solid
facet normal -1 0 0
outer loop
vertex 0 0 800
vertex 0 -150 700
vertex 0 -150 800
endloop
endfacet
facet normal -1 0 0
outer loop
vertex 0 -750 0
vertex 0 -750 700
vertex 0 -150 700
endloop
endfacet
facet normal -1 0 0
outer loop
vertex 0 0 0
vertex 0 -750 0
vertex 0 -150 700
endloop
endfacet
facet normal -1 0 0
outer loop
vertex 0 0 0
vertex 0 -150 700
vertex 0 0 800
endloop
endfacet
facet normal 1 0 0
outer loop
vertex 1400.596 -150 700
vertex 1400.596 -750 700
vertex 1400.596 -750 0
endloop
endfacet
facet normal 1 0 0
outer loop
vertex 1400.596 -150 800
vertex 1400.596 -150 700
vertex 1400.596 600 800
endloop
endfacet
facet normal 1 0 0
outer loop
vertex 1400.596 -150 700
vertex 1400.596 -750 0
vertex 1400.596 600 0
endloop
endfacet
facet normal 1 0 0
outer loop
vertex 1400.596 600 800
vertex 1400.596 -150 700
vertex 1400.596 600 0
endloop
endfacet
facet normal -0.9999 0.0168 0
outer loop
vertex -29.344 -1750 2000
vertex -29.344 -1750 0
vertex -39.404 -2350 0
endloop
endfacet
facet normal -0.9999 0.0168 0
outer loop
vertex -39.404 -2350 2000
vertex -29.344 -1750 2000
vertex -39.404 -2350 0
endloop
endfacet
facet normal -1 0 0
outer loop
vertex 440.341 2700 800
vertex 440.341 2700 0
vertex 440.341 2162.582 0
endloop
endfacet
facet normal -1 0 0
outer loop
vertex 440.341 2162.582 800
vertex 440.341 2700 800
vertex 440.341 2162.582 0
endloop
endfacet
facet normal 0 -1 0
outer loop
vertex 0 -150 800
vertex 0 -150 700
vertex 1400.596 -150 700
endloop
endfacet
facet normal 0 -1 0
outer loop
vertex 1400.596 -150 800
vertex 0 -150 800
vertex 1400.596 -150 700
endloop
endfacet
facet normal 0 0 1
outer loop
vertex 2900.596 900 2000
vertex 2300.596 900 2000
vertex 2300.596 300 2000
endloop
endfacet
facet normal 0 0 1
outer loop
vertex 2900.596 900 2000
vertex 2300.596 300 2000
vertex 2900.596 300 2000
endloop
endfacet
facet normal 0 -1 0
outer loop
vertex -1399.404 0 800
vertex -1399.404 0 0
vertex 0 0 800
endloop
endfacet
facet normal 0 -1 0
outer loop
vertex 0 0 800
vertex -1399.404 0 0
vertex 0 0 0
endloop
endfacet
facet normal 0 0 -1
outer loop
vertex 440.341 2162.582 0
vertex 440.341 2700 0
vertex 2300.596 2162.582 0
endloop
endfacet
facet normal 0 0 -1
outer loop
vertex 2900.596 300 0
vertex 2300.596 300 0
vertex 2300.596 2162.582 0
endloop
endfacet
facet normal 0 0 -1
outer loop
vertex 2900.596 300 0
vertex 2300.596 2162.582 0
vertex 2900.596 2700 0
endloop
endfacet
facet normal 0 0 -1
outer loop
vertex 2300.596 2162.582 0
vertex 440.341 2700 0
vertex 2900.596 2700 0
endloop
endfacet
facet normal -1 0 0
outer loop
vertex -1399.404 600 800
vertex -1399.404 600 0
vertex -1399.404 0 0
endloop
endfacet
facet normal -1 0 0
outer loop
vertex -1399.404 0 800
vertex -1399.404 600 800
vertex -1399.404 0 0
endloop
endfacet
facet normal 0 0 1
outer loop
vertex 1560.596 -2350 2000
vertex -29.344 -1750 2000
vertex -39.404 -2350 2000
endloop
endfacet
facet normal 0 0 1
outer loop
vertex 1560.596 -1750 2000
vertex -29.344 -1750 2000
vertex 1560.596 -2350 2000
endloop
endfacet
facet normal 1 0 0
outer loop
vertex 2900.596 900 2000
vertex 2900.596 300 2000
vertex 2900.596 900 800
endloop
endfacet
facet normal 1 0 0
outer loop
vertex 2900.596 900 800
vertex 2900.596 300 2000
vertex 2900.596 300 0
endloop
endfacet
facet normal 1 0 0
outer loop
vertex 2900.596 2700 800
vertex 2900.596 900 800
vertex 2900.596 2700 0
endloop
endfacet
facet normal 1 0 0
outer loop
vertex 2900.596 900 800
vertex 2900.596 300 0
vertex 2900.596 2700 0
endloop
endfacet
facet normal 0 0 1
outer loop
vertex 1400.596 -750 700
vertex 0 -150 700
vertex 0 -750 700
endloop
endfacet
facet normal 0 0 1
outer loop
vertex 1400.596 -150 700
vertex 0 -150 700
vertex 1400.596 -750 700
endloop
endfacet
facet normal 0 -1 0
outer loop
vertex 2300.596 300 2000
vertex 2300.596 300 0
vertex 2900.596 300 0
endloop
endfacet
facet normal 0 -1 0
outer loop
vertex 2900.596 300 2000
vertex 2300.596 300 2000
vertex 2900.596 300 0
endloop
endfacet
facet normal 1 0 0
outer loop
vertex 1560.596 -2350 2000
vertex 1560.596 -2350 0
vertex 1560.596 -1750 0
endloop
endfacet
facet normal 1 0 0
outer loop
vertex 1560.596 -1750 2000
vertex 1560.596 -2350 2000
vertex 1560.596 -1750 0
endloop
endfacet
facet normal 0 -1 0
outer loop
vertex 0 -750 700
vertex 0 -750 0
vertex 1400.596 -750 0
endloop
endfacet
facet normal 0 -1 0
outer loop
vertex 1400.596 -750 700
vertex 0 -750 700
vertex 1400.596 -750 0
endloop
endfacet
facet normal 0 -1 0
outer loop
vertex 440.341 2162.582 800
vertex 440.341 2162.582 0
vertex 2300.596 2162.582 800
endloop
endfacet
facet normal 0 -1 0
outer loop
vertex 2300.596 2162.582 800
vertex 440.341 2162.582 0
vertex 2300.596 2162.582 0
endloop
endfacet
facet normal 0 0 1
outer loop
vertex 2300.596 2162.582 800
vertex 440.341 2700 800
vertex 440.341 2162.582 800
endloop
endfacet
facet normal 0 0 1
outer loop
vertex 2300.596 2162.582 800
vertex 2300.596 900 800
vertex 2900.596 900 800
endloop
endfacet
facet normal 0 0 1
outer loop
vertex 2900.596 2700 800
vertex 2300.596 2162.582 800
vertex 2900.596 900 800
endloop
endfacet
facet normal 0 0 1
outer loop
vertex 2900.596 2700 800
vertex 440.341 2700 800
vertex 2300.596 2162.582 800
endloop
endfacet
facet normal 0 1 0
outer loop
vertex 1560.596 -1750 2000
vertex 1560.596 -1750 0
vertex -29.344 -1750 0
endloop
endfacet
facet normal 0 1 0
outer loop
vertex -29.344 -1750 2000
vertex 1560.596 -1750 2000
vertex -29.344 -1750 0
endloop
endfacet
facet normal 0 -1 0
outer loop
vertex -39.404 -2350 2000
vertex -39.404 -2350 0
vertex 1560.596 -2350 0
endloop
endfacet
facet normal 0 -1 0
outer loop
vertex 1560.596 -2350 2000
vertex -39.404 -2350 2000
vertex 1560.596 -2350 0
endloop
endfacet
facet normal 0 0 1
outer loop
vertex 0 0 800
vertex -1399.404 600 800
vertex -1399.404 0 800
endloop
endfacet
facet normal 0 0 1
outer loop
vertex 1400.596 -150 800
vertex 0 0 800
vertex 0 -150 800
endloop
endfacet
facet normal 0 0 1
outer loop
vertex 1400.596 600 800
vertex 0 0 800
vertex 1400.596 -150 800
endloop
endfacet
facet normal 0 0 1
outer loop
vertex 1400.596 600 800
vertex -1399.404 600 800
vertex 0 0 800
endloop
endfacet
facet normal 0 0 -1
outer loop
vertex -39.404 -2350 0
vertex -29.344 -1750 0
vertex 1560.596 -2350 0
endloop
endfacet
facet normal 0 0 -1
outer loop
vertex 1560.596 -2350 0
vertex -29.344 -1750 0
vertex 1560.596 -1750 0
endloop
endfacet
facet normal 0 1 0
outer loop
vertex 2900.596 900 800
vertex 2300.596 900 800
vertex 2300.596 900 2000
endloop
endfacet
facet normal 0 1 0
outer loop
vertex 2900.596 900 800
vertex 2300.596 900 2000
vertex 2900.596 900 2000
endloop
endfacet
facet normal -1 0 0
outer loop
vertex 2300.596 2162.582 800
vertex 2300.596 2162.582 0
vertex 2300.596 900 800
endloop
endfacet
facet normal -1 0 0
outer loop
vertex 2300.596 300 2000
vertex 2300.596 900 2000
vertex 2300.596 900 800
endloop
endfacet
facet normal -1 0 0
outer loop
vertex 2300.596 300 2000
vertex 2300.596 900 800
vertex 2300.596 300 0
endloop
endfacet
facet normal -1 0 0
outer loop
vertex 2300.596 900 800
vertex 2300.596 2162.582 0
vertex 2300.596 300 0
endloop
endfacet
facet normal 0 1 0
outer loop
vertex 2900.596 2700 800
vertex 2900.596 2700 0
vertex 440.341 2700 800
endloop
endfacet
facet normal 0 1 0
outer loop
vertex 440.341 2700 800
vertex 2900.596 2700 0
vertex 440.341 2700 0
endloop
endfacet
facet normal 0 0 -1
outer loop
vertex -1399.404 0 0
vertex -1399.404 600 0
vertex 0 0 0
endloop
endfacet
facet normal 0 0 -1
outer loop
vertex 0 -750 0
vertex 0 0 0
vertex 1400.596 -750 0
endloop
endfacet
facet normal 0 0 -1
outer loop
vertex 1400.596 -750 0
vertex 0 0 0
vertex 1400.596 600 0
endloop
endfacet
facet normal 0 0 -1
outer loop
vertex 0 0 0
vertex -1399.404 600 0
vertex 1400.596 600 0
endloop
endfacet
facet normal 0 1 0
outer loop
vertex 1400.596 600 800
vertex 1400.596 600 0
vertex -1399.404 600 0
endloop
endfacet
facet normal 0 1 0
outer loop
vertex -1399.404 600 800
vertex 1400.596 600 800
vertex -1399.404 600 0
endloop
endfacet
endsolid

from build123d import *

# Parameters (mm, degrees)
F3_DEPTH = 800
F4_DEPTH = 2000
F0_W     = 600
F0_H     = 600
F5_DEPTH = 2000
F6_DEPTH = 800
F0_W_2   = 1400.595679329
F7_DEPTH = 700


# Not quite as in the source:
# - the program builds the solid bodies; features that only make, move or delete a surface that nothing else refers to are left out


with BuildPart() as f3:
    # F0 (on Top) → F3 (new body)
    with BuildSketch(Plane.XY):
        Polygon((-1399.404320671, 600), (-1399.404320671, 0), (0, 0), (0, -150), (1400.595679329, -150), (1400.595679329, 600), align=None)
    extrude(amount=F3_DEPTH)

    # F0 (on Top) → F7 (join)
    with BuildSketch(Plane.XY):
        with Locations((700.2978396645, -450)):
            Rectangle(F0_W_2, F0_H)
    extrude(amount=F7_DEPTH)


with BuildPart() as f4:
    # F0 (on Top) → F4 (new body)
    with BuildSketch(Plane.XY):
        Polygon((1560.595679329, -1750), (-29.3436430529, -1750), (-39.404320671, -2350), (1560.595679329, -2350), align=None)
    extrude(amount=F4_DEPTH)


with BuildPart() as f5:
    # F0 (on Top) → F5 (new body, through all)
    with BuildSketch(Plane.XY):
        with Locations((2600.595679329, 600)):
            Rectangle(F0_W, F0_H)
    extrude(amount=F5_DEPTH)

    # F0 (on Top) → F6 (join, through all)
    with BuildSketch(Plane.XY):
        Polygon((490.595679329, 2700), (440.3408169746, 2700), (440.3408169746, 2162.5823974609), (2300.595679329, 2162.5823974609), (2300.595679329, 900), (2900.595679329, 900), (2900.595679329, 2700), (2150.595679329, 2700), align=None)
    extrude(amount=F6_DEPTH)


solid = Compound([f3.part, f4.part, f5.part])
